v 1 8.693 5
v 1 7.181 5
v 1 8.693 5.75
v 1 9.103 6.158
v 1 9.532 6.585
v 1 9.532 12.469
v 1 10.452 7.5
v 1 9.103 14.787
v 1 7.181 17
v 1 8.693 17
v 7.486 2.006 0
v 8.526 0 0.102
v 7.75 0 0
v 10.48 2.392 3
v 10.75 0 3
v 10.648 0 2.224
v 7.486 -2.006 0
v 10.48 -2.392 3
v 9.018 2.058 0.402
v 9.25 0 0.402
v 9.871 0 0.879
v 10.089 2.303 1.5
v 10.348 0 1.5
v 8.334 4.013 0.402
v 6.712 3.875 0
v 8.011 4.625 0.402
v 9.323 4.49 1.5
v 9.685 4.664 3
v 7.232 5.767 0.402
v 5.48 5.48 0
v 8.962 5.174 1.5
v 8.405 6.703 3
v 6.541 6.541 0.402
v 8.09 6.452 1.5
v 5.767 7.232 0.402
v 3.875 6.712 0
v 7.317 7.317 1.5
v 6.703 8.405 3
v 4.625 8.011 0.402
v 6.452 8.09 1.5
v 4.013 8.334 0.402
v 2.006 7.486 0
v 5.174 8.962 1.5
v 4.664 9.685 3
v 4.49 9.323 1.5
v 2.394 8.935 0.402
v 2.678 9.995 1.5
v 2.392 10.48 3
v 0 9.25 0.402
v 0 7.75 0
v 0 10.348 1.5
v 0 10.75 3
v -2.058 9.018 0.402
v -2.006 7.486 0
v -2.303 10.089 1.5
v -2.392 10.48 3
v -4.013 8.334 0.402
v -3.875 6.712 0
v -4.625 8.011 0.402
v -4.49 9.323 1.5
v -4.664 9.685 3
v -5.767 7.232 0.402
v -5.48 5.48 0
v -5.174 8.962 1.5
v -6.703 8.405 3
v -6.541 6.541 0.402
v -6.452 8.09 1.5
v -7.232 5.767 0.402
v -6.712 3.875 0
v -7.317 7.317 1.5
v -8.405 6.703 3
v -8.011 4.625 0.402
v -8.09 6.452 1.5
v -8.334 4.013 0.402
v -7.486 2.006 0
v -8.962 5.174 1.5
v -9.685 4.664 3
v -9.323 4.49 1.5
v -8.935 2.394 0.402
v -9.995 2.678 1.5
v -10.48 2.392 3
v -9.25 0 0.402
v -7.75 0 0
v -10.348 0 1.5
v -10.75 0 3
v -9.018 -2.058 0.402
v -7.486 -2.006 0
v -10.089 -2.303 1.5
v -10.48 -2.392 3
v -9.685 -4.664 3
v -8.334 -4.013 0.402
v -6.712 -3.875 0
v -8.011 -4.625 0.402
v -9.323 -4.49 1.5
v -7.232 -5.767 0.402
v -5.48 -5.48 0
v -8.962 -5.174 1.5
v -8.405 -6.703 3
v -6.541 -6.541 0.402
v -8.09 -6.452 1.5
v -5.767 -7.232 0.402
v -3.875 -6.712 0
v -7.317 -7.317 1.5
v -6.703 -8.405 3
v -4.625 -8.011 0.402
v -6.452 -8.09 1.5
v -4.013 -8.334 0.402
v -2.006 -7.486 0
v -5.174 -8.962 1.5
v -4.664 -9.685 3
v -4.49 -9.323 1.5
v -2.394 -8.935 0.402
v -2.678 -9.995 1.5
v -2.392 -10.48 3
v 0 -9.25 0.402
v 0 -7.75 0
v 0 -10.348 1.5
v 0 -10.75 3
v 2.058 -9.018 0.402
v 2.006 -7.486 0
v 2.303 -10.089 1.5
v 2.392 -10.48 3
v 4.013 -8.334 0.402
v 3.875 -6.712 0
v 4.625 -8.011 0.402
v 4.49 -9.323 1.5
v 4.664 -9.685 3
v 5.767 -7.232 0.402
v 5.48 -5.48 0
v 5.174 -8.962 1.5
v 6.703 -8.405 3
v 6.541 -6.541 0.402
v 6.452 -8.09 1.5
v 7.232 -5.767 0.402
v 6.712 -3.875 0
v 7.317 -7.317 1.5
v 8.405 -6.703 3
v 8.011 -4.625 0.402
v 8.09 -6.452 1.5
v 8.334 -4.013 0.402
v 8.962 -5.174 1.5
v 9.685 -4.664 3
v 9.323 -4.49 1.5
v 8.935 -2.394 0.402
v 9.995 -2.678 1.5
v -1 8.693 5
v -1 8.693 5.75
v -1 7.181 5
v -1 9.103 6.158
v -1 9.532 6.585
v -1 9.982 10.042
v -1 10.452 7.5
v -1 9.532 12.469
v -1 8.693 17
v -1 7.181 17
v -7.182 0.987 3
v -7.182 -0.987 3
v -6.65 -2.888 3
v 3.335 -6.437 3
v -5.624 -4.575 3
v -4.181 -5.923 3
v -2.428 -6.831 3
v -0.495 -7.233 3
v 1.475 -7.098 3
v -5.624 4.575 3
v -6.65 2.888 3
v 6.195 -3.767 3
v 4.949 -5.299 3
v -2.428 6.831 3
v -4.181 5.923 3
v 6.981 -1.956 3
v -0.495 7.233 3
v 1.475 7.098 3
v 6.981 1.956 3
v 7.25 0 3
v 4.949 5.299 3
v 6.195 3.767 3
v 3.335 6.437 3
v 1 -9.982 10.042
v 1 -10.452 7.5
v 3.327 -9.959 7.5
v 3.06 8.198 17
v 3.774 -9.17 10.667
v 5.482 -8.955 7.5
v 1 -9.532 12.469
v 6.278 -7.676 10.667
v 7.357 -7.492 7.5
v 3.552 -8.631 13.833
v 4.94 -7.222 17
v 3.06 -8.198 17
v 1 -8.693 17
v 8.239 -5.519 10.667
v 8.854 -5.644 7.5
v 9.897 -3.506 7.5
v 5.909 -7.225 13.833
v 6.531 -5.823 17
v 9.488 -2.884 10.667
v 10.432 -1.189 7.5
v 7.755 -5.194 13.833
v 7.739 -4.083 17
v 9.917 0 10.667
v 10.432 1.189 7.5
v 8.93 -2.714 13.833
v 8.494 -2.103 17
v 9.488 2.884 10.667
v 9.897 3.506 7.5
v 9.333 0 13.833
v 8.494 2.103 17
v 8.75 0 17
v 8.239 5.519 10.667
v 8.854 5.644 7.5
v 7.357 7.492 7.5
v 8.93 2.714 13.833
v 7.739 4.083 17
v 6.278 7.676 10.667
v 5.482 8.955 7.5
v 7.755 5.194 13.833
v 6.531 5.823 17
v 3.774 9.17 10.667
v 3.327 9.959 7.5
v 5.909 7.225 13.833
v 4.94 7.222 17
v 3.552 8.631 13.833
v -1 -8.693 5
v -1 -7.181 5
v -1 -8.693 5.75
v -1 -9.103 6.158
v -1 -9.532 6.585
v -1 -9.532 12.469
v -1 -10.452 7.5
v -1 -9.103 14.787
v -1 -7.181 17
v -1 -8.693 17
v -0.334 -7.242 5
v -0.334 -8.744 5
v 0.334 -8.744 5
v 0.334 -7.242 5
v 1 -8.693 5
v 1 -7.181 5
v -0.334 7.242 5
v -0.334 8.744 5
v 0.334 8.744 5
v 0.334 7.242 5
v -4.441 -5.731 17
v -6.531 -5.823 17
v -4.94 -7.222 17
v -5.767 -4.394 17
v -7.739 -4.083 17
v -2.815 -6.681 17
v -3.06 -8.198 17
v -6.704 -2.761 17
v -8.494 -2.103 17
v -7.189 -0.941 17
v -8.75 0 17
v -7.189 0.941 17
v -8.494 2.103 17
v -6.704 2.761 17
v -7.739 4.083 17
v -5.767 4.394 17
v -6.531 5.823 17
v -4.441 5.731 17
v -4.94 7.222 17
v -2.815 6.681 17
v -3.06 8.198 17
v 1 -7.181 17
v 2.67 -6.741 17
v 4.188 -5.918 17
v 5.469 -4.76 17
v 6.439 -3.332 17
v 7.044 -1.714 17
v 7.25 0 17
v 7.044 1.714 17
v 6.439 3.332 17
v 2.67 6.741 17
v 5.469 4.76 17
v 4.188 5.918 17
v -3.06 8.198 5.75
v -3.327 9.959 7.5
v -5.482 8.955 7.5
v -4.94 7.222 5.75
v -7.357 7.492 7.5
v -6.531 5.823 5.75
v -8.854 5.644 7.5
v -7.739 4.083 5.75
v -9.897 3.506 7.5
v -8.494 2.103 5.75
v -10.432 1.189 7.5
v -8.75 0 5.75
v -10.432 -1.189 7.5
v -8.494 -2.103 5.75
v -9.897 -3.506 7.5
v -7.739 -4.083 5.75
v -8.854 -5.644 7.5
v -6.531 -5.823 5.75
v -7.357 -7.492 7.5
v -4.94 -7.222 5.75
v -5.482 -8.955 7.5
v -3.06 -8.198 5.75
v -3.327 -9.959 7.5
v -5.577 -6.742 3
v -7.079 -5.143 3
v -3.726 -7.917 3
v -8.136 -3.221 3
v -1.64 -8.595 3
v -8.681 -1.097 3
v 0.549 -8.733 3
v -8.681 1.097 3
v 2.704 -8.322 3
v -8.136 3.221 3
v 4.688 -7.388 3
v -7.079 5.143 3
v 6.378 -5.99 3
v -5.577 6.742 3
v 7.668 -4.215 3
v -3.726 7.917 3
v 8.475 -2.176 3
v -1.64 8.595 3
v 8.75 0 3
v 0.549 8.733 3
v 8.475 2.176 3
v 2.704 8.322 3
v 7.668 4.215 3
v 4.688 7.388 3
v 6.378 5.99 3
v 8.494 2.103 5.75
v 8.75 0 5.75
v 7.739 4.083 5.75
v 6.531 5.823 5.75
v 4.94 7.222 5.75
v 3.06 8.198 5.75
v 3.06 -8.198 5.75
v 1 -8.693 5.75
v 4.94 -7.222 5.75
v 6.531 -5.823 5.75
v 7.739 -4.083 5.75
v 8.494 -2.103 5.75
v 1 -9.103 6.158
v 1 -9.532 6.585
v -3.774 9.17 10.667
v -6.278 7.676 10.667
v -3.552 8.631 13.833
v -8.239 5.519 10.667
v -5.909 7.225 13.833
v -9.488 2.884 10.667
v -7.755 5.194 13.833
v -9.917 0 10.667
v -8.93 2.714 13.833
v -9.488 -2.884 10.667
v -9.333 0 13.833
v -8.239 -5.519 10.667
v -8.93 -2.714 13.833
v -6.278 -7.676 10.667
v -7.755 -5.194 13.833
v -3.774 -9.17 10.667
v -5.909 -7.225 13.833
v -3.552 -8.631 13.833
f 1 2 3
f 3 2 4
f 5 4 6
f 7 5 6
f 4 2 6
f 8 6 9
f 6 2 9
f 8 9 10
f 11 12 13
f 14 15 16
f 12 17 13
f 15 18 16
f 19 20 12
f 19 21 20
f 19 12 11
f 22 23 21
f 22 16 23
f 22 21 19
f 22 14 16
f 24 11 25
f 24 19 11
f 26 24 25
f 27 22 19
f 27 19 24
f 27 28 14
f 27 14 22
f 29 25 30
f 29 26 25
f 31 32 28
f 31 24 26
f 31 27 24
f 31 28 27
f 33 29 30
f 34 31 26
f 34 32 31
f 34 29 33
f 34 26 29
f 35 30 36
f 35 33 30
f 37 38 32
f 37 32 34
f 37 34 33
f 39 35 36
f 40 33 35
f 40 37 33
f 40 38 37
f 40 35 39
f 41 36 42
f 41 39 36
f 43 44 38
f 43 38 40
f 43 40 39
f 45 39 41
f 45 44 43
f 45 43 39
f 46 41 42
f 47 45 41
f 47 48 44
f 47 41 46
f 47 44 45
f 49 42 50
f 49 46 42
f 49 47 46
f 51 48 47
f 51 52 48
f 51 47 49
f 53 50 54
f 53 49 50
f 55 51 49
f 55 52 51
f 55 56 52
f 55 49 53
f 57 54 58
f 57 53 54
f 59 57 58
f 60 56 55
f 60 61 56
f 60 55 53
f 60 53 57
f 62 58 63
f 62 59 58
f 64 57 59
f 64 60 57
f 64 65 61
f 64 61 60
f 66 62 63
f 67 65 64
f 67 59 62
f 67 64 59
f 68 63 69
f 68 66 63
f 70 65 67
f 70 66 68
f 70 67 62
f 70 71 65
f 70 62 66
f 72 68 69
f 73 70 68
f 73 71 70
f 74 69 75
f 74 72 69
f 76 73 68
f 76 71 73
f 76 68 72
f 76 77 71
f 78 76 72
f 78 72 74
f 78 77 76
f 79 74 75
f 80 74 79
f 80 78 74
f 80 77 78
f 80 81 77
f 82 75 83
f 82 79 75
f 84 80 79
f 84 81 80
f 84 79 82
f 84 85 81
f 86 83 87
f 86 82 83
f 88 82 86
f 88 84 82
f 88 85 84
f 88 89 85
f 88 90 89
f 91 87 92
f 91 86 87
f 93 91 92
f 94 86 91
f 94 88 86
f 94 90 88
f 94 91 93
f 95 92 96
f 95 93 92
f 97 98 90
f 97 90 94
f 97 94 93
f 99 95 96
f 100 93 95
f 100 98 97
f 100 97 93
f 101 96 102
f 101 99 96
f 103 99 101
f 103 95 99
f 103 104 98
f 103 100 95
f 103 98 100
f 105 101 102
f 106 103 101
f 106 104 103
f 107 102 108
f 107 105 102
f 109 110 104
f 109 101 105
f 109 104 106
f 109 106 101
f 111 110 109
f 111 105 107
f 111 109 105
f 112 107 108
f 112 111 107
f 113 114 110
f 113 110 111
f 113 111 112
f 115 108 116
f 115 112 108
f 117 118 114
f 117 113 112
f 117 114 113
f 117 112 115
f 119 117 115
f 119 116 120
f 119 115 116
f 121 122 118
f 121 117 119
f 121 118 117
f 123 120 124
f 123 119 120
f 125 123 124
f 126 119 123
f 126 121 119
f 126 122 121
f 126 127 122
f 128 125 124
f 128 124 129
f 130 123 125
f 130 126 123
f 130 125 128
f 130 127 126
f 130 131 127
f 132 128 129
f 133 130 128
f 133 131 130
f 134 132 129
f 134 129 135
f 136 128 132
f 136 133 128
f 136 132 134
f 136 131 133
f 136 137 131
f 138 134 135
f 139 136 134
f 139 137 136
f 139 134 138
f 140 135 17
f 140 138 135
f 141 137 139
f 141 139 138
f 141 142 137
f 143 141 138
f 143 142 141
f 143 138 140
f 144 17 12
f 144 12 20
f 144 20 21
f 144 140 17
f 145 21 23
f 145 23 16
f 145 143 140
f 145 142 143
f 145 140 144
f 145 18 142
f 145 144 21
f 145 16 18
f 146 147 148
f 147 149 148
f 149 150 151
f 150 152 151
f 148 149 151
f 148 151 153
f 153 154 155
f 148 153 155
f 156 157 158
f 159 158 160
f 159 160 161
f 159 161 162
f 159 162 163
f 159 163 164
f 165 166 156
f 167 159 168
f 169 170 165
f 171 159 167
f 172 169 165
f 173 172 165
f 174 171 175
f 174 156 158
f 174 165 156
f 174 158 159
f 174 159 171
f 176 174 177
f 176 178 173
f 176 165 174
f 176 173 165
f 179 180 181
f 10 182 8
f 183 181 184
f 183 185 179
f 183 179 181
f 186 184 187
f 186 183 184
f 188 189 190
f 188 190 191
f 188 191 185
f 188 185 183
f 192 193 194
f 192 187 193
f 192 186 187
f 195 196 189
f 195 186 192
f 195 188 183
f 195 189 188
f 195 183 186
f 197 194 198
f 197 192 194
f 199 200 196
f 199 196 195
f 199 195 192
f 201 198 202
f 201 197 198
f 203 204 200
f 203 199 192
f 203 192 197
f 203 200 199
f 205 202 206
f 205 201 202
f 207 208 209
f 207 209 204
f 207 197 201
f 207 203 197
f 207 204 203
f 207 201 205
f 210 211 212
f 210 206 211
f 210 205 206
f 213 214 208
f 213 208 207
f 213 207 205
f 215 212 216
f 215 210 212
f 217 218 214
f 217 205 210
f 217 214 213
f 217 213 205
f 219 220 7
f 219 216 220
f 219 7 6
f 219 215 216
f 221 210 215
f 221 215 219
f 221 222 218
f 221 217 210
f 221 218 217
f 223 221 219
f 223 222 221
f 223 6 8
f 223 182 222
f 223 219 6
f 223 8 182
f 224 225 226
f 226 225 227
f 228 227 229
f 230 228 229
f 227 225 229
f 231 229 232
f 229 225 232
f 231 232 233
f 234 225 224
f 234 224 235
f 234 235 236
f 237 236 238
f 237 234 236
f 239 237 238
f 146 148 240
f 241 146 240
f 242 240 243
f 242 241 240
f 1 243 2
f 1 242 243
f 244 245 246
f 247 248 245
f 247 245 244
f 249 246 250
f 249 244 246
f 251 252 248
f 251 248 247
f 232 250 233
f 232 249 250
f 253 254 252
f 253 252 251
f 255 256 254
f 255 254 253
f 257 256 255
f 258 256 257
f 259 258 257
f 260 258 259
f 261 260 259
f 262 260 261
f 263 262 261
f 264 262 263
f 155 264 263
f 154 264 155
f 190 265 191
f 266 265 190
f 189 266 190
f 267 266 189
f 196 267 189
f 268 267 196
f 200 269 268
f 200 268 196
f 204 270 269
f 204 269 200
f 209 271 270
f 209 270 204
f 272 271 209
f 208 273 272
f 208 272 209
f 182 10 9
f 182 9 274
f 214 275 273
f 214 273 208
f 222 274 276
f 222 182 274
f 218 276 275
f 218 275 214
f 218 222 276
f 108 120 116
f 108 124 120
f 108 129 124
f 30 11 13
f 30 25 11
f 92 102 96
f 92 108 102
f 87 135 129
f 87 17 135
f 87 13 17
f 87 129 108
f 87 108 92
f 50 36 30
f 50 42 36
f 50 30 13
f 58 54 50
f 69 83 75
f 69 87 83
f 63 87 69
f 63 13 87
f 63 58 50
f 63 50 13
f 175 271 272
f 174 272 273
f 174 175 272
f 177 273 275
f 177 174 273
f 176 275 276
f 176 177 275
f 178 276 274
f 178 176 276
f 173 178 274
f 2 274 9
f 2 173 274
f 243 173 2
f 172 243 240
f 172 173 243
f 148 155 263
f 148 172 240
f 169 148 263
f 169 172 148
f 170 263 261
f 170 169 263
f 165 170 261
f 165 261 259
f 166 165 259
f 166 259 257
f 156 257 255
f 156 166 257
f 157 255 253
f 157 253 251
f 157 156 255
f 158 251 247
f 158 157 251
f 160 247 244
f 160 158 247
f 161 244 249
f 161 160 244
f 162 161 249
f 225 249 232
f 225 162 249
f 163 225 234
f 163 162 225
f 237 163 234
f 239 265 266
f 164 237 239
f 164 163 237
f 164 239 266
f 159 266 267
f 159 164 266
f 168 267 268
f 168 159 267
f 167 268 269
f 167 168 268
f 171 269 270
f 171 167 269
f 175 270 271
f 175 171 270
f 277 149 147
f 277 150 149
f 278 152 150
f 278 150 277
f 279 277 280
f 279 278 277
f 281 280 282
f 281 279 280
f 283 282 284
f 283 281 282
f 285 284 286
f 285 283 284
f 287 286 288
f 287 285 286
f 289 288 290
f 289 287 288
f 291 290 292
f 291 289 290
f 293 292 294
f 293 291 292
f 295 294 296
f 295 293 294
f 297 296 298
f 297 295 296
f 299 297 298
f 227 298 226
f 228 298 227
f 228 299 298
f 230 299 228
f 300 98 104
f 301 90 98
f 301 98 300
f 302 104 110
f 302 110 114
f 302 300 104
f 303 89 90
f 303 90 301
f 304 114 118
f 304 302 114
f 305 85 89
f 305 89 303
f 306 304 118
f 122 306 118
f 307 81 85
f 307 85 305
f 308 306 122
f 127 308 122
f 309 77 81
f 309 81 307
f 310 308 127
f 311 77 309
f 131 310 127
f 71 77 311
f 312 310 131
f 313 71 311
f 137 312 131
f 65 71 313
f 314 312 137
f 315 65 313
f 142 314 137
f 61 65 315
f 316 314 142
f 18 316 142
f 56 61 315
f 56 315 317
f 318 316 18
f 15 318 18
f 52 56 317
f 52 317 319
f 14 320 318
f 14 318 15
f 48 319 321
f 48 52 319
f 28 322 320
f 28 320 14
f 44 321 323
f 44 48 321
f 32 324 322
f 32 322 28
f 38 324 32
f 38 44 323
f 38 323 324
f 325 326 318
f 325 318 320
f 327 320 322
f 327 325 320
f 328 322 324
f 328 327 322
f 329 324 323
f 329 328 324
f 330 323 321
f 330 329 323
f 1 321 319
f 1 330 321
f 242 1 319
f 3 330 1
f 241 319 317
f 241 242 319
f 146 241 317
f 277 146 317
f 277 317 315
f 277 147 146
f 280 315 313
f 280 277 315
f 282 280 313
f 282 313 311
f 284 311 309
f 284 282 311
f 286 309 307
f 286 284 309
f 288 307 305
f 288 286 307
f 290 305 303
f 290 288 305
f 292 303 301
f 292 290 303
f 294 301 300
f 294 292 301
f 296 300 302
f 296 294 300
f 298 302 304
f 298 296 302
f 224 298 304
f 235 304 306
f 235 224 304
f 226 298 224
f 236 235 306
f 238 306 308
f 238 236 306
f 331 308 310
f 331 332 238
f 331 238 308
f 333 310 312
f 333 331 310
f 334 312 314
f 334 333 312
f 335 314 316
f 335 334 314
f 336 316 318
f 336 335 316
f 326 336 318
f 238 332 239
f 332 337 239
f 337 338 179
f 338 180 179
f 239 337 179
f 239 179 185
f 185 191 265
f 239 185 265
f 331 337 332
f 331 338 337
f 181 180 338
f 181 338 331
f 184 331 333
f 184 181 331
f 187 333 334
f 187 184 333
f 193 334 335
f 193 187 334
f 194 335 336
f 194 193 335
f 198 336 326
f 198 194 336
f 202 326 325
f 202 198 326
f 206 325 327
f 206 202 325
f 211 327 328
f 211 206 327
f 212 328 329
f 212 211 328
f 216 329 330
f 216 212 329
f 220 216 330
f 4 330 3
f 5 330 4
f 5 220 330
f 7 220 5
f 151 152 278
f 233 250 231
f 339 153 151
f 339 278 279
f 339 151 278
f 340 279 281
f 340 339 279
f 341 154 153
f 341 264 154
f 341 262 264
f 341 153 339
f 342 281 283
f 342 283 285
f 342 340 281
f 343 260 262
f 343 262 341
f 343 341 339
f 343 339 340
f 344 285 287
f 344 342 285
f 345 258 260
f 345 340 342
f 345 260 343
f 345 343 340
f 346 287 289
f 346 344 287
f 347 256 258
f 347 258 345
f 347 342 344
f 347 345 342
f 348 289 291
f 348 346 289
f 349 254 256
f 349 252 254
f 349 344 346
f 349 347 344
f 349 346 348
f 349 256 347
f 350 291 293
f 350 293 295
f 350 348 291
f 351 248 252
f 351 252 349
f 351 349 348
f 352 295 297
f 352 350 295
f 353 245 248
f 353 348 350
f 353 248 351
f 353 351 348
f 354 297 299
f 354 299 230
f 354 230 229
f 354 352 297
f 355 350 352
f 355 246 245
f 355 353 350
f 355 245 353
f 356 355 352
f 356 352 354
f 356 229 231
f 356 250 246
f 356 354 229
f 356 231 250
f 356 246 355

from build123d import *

# Parameters (mm, degrees)
F3_DEPTH = 12
F4_R     = 2.99999
F5_SIZE  = 1.74999


# Not quite as in the source:
# - a fillet or chamfer is up to 0.001 mm smaller than in the source, because OpenCascade refuses the exact size


with BuildPart() as f1:
    # F0 (on Front) → F1 (revolve)
    with BuildSketch(Plane.XZ):
        Polygon((0, 3), (0, 0), (10.75, 0), (10.75, 3), (8.75, 3), (8.75, 7.5), (10.5, 7.5), (8.75, 17), (7.25, 17), (7.25, 3), align=None)
    revolve(axis=Axis((0, 0, 1.5), (0, 0, 1)))

    # F2 (on face) → F3 (cut, through all)
    with BuildSketch(Plane.XY.offset(17)):
        with BuildLine():
            Line((1, -7.1807033082), (1, 7.1807033082))
            ThreePointArc((1, 7.1807033082), (0, 7.25), (-1, 7.1807033082))
            Line((-1, 7.1807033082), (-1, -7.1807033082))
            ThreePointArc((-1, -7.1807033082), (0, -7.25), (1, -7.1807033082))
        make_face()
        with BuildLine():
            Line((1, 7.1807033082), (1, 8.6926693254))
            ThreePointArc((1, 8.6926693254), (0, 8.75), (-1, 8.6926693254))
            Line((-1, 8.6926693254), (-1, 7.1807033082))
            ThreePointArc((-1, 7.1807033082), (0, 7.25), (1, 7.1807033082))
        make_face()
        with BuildLine():
            Line((-1, -7.1807033082), (-1, -8.6926693254))
            ThreePointArc((-1, -8.6926693254), (0, -8.75), (1, -8.6926693254))
            Line((1, -8.6926693254), (1, -7.1807033082))
            ThreePointArc((1, -7.1807033082), (0, -7.25), (-1, -7.1807033082))
        make_face()
        with BuildLine():
            ThreePointArc((1, -8.6926693254), (0, -8.75), (-1, -8.6926693254))
            Line((-1, -8.6926693254), (-1, -25))
            Line((-1, -25), (1, -25))
            Line((1, -25), (1, -8.6926693254))
        make_face()
        with BuildLine():
            Line((1, 8.6926693254), (1, 25))
            Line((1, 25), (-1, 25))
            Line((-1, 25), (-1, 8.6926693254))
            ThreePointArc((-1, 8.6926693254), (0, 8.75), (1, 8.6926693254))
        make_face()
    extrude(amount=-F3_DEPTH, mode=Mode.SUBTRACT)

    # F4 (radius 3 in the source; OpenCascade refuses exactly that, so slightly less here)
    f4_edges = [f1.edges().sort_by_distance(p)[0] for p in [
        (-10.75, 0, 0),
    ]]
    fillet(f4_edges, radius=F4_R)

    # F5 (size 1.75 in the source; OpenCascade refuses exactly that, so slightly less here)
    f5_edges = [f1.edges().sort_by_distance(p)[0] for p in [
        (-8.75, 0, 7.5),
        (6.531175, 5.822907, 7.5),
        (6.531175, -5.822907, 7.5),
    ]]
    chamfer(f5_edges, length=F5_SIZE)


solid = f1.part
